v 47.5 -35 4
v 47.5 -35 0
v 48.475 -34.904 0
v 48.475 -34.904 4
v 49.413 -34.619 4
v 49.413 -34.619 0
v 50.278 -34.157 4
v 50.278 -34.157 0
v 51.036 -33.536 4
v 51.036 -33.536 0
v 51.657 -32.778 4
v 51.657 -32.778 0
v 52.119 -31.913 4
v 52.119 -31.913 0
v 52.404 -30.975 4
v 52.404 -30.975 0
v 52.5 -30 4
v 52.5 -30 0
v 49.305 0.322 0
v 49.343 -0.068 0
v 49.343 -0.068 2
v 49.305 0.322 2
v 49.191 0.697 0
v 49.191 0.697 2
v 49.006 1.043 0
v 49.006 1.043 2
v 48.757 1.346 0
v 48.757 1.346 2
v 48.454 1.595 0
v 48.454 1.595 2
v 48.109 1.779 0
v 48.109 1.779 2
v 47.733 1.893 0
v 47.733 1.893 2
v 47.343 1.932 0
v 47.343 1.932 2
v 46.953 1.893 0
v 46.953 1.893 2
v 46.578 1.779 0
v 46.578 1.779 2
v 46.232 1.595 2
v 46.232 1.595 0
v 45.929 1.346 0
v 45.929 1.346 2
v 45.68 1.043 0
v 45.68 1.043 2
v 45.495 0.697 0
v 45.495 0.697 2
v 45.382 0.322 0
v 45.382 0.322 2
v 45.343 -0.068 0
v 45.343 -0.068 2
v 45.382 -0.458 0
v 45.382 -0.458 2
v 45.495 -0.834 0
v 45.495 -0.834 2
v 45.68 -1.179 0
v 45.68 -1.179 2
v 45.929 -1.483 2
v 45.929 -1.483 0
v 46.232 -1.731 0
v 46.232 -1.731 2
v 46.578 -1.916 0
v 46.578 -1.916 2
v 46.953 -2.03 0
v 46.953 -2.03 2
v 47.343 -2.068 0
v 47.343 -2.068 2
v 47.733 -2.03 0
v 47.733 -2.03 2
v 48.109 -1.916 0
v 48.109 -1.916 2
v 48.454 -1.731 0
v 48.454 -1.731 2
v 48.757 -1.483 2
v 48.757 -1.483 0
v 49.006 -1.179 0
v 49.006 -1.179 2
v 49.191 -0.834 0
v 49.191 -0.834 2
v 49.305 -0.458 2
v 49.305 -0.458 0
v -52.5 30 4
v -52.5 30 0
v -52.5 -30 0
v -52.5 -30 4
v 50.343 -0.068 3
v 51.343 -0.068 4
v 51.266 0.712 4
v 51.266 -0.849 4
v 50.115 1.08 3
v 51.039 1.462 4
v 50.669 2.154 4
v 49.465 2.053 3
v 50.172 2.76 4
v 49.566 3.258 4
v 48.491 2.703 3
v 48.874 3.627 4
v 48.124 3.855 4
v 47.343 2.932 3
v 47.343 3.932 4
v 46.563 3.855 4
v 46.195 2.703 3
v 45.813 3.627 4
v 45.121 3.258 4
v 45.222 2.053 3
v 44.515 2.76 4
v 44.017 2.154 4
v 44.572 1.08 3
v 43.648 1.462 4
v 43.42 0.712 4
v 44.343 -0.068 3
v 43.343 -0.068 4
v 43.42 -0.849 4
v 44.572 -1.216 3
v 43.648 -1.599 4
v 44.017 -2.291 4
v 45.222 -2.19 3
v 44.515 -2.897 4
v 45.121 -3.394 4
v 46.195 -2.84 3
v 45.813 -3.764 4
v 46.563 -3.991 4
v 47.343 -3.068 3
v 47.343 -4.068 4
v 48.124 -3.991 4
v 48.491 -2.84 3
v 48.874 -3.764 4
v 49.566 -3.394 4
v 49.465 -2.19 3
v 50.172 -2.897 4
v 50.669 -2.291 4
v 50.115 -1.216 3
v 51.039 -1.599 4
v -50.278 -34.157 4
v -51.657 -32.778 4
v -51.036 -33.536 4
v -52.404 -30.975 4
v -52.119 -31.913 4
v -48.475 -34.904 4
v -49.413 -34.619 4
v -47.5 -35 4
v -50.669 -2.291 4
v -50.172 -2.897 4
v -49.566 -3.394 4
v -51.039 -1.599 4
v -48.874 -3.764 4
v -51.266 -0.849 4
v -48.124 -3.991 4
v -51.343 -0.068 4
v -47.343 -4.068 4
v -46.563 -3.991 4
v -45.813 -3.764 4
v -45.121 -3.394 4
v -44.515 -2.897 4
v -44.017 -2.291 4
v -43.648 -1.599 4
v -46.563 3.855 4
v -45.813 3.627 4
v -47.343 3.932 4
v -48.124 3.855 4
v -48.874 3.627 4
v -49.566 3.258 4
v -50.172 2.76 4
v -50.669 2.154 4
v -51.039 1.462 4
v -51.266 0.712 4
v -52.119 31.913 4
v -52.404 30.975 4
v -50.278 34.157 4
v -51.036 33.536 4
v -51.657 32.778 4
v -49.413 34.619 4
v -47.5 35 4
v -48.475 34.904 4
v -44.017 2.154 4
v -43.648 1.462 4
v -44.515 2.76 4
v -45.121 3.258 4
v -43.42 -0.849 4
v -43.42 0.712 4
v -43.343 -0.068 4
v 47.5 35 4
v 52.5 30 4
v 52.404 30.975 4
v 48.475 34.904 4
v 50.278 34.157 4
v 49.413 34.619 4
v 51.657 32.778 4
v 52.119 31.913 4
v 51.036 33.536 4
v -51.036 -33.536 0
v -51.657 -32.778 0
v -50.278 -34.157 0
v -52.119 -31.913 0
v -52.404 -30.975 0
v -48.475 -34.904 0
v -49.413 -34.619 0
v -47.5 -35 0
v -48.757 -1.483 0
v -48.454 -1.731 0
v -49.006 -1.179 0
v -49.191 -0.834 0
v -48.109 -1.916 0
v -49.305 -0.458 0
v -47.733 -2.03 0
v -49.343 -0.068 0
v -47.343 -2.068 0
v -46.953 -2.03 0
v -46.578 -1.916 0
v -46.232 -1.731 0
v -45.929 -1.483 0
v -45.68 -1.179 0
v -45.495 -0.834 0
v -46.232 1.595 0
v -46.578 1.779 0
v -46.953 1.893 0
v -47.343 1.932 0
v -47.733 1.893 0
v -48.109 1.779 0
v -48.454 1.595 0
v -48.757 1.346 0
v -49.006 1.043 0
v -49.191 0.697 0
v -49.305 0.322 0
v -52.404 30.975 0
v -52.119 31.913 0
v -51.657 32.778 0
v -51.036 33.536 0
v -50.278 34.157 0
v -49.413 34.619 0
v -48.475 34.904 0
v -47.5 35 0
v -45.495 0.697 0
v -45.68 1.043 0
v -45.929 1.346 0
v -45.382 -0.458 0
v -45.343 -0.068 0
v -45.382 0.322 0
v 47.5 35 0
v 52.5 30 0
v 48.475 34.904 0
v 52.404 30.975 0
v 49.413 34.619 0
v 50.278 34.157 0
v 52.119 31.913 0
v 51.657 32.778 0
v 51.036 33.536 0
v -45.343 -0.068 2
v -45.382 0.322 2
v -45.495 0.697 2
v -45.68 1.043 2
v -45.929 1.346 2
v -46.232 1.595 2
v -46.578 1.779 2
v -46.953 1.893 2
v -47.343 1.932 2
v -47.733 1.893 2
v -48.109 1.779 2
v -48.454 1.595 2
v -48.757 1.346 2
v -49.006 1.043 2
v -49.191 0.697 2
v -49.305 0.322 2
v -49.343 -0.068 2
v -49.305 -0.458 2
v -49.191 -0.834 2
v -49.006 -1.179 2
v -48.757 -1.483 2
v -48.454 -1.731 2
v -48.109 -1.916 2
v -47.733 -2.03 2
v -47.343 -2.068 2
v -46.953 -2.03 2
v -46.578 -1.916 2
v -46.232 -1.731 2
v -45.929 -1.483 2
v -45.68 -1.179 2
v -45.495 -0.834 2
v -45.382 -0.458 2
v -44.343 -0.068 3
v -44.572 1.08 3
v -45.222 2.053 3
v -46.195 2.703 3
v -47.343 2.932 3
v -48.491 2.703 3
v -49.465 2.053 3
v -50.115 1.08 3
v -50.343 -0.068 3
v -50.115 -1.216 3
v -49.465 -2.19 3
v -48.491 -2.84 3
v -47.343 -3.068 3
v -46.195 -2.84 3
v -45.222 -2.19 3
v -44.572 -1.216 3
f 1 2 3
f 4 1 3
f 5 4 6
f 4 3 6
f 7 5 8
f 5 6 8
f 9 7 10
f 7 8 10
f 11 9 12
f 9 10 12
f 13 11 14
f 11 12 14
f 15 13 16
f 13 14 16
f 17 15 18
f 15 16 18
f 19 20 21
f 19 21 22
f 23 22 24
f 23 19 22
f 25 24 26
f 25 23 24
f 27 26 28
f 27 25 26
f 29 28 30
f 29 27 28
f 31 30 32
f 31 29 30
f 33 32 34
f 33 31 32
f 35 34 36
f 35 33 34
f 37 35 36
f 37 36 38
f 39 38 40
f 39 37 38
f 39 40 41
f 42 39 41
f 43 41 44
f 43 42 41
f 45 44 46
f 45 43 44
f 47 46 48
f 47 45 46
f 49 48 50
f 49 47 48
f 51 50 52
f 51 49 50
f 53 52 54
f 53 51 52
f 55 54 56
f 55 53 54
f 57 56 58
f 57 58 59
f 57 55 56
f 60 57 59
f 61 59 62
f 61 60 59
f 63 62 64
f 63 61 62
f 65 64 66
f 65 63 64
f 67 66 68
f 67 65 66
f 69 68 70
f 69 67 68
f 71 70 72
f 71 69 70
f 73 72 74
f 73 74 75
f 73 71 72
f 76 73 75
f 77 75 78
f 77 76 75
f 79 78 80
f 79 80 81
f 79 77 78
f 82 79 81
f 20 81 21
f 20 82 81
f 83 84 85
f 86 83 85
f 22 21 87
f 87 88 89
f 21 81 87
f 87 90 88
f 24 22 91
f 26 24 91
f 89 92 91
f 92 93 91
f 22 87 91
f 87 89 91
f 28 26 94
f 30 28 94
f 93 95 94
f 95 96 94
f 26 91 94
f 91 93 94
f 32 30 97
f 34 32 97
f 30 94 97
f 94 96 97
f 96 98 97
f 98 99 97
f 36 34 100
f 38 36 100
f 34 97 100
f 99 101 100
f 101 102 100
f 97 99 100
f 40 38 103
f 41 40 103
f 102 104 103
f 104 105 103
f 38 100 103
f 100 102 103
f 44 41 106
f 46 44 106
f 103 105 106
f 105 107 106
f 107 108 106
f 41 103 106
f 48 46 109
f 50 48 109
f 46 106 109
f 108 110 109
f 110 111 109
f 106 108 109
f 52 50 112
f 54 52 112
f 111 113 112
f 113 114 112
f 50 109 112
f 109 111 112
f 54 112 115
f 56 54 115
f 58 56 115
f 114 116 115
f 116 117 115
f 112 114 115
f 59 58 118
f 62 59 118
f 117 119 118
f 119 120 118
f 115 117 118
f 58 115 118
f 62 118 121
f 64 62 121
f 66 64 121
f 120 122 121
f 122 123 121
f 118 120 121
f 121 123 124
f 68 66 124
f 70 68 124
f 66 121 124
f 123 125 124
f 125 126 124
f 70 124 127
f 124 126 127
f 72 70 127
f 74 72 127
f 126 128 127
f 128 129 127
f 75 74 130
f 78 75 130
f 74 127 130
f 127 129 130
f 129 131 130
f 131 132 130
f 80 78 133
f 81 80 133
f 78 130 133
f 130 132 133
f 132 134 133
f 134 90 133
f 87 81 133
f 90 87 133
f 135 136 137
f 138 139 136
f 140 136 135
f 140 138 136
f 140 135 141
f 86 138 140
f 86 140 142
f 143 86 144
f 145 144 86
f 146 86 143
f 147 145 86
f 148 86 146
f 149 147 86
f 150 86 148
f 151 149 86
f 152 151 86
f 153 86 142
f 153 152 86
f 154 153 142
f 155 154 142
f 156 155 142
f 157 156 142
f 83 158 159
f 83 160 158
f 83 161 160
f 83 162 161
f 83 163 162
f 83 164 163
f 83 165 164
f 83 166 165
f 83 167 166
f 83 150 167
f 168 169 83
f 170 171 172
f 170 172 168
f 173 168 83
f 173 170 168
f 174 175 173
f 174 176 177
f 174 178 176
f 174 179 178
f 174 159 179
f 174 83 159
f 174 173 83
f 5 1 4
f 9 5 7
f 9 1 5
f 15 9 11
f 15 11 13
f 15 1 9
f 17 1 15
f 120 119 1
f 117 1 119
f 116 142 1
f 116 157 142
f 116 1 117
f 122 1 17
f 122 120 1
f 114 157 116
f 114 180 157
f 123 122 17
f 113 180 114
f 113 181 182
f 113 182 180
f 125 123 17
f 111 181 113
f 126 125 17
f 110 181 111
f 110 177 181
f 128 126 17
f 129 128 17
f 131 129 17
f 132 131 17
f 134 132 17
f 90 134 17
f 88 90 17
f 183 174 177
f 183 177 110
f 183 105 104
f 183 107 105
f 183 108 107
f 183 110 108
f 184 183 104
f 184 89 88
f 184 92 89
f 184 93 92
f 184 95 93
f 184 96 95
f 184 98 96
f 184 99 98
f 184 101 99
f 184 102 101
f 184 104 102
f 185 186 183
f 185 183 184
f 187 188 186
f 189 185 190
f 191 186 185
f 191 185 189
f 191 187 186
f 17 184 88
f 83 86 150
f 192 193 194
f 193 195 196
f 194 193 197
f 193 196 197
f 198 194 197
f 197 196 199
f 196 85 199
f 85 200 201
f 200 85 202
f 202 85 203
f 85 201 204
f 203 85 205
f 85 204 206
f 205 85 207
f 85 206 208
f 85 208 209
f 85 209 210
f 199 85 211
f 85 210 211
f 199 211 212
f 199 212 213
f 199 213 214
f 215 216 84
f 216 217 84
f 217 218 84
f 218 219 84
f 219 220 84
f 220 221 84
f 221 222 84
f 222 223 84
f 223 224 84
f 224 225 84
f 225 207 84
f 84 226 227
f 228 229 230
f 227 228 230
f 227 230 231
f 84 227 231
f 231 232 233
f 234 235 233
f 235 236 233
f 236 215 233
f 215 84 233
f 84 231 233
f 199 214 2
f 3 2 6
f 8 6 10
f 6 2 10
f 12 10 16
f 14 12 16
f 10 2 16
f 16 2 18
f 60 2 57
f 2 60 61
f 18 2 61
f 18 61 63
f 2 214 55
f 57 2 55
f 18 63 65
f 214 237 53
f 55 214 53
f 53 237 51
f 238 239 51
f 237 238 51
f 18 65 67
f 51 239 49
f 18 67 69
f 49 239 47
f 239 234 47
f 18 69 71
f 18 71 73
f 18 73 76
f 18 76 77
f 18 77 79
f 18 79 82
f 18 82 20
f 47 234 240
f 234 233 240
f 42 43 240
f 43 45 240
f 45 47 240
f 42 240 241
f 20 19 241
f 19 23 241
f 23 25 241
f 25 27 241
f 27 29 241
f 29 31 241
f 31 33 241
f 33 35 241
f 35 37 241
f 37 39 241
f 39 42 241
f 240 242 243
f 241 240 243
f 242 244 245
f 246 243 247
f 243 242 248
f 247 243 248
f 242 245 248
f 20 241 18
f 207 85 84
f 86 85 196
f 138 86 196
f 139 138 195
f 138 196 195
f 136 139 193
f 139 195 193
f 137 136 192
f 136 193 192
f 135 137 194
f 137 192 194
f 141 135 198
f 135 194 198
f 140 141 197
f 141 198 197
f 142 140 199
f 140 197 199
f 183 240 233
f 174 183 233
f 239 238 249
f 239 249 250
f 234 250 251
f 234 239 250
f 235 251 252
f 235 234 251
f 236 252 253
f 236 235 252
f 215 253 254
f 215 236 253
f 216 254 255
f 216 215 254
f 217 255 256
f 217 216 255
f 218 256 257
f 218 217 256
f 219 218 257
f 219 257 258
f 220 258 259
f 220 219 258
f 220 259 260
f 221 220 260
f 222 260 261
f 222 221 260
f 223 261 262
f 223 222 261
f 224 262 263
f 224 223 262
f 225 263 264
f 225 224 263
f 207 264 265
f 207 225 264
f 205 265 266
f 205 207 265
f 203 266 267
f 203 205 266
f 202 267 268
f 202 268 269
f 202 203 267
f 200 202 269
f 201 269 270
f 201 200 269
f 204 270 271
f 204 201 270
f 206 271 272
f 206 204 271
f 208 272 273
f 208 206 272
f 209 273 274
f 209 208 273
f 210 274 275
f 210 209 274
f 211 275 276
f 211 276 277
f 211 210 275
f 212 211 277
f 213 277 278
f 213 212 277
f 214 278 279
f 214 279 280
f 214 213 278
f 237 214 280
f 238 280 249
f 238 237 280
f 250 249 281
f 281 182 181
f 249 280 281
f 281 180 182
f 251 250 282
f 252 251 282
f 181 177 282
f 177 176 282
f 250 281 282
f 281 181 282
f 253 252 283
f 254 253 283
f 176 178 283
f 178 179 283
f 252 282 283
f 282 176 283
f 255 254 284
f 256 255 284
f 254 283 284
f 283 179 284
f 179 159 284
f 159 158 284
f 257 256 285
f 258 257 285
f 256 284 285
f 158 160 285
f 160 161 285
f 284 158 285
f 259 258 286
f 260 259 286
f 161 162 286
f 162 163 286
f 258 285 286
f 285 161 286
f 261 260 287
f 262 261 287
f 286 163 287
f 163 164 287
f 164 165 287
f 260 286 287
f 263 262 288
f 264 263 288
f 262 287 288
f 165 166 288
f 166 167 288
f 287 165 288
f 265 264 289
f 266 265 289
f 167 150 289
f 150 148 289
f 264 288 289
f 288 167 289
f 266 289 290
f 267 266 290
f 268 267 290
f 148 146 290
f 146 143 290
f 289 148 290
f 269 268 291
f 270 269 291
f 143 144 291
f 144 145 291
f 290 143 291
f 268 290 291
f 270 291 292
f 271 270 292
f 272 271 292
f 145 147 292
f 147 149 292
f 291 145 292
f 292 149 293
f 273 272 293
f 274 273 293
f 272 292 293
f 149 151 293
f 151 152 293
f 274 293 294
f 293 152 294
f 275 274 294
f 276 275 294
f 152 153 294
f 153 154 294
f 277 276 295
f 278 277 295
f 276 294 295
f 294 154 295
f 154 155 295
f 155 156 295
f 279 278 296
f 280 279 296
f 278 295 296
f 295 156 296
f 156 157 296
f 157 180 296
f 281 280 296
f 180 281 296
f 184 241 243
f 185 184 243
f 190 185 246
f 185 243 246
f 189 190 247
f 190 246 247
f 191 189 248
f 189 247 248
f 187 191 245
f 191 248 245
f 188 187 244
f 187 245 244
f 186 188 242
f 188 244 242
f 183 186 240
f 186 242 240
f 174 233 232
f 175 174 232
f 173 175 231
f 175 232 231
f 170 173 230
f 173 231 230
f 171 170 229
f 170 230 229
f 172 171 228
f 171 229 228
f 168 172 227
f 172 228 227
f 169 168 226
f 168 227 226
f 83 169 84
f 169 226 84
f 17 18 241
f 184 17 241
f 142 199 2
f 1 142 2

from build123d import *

# Parameters (mm, degrees)
F0_R     = 2
F1_DEPTH = 4
F2_SIZE  = 2


with BuildPart() as f1:
    # F0 (on Top) → F1 (new body)
    with BuildSketch(Plane.XY):
        with BuildLine():
            Line((-47.5, -35), (47.5, -35))
            ThreePointArc((47.5, -35), (51.035534, -33.535534), (52.5, -30))
            Line((52.5, -30), (52.5, 30))
            ThreePointArc((52.5, 30), (51.035534, 33.535534), (47.5, 35))
            Line((47.5, 35), (-47.5, 35))
            ThreePointArc((-47.5, 35), (-51.035534, 33.535534), (-52.5, 30))
            Line((-52.5, 30), (-52.5, -30))
            ThreePointArc((-52.5, -30), (-51.035534, -33.535534), (-47.5, -35))
        make_face()
        with Locations((-47.343245, -0.068288)):
            Circle(F0_R, mode=Mode.SUBTRACT)
        with Locations((47.343245, -0.068288)):
            Circle(F0_R, mode=Mode.SUBTRACT)
    extrude(amount=F1_DEPTH)

    # F2
    f2_edges = [f1.edges().sort_by_distance(p)[0] for p in [
        (-49.343245, -0.068288, 4),
        (45.343245, -0.068288, 4),
    ]]
    chamfer(f2_edges, length=F2_SIZE)


solid = f1.part
